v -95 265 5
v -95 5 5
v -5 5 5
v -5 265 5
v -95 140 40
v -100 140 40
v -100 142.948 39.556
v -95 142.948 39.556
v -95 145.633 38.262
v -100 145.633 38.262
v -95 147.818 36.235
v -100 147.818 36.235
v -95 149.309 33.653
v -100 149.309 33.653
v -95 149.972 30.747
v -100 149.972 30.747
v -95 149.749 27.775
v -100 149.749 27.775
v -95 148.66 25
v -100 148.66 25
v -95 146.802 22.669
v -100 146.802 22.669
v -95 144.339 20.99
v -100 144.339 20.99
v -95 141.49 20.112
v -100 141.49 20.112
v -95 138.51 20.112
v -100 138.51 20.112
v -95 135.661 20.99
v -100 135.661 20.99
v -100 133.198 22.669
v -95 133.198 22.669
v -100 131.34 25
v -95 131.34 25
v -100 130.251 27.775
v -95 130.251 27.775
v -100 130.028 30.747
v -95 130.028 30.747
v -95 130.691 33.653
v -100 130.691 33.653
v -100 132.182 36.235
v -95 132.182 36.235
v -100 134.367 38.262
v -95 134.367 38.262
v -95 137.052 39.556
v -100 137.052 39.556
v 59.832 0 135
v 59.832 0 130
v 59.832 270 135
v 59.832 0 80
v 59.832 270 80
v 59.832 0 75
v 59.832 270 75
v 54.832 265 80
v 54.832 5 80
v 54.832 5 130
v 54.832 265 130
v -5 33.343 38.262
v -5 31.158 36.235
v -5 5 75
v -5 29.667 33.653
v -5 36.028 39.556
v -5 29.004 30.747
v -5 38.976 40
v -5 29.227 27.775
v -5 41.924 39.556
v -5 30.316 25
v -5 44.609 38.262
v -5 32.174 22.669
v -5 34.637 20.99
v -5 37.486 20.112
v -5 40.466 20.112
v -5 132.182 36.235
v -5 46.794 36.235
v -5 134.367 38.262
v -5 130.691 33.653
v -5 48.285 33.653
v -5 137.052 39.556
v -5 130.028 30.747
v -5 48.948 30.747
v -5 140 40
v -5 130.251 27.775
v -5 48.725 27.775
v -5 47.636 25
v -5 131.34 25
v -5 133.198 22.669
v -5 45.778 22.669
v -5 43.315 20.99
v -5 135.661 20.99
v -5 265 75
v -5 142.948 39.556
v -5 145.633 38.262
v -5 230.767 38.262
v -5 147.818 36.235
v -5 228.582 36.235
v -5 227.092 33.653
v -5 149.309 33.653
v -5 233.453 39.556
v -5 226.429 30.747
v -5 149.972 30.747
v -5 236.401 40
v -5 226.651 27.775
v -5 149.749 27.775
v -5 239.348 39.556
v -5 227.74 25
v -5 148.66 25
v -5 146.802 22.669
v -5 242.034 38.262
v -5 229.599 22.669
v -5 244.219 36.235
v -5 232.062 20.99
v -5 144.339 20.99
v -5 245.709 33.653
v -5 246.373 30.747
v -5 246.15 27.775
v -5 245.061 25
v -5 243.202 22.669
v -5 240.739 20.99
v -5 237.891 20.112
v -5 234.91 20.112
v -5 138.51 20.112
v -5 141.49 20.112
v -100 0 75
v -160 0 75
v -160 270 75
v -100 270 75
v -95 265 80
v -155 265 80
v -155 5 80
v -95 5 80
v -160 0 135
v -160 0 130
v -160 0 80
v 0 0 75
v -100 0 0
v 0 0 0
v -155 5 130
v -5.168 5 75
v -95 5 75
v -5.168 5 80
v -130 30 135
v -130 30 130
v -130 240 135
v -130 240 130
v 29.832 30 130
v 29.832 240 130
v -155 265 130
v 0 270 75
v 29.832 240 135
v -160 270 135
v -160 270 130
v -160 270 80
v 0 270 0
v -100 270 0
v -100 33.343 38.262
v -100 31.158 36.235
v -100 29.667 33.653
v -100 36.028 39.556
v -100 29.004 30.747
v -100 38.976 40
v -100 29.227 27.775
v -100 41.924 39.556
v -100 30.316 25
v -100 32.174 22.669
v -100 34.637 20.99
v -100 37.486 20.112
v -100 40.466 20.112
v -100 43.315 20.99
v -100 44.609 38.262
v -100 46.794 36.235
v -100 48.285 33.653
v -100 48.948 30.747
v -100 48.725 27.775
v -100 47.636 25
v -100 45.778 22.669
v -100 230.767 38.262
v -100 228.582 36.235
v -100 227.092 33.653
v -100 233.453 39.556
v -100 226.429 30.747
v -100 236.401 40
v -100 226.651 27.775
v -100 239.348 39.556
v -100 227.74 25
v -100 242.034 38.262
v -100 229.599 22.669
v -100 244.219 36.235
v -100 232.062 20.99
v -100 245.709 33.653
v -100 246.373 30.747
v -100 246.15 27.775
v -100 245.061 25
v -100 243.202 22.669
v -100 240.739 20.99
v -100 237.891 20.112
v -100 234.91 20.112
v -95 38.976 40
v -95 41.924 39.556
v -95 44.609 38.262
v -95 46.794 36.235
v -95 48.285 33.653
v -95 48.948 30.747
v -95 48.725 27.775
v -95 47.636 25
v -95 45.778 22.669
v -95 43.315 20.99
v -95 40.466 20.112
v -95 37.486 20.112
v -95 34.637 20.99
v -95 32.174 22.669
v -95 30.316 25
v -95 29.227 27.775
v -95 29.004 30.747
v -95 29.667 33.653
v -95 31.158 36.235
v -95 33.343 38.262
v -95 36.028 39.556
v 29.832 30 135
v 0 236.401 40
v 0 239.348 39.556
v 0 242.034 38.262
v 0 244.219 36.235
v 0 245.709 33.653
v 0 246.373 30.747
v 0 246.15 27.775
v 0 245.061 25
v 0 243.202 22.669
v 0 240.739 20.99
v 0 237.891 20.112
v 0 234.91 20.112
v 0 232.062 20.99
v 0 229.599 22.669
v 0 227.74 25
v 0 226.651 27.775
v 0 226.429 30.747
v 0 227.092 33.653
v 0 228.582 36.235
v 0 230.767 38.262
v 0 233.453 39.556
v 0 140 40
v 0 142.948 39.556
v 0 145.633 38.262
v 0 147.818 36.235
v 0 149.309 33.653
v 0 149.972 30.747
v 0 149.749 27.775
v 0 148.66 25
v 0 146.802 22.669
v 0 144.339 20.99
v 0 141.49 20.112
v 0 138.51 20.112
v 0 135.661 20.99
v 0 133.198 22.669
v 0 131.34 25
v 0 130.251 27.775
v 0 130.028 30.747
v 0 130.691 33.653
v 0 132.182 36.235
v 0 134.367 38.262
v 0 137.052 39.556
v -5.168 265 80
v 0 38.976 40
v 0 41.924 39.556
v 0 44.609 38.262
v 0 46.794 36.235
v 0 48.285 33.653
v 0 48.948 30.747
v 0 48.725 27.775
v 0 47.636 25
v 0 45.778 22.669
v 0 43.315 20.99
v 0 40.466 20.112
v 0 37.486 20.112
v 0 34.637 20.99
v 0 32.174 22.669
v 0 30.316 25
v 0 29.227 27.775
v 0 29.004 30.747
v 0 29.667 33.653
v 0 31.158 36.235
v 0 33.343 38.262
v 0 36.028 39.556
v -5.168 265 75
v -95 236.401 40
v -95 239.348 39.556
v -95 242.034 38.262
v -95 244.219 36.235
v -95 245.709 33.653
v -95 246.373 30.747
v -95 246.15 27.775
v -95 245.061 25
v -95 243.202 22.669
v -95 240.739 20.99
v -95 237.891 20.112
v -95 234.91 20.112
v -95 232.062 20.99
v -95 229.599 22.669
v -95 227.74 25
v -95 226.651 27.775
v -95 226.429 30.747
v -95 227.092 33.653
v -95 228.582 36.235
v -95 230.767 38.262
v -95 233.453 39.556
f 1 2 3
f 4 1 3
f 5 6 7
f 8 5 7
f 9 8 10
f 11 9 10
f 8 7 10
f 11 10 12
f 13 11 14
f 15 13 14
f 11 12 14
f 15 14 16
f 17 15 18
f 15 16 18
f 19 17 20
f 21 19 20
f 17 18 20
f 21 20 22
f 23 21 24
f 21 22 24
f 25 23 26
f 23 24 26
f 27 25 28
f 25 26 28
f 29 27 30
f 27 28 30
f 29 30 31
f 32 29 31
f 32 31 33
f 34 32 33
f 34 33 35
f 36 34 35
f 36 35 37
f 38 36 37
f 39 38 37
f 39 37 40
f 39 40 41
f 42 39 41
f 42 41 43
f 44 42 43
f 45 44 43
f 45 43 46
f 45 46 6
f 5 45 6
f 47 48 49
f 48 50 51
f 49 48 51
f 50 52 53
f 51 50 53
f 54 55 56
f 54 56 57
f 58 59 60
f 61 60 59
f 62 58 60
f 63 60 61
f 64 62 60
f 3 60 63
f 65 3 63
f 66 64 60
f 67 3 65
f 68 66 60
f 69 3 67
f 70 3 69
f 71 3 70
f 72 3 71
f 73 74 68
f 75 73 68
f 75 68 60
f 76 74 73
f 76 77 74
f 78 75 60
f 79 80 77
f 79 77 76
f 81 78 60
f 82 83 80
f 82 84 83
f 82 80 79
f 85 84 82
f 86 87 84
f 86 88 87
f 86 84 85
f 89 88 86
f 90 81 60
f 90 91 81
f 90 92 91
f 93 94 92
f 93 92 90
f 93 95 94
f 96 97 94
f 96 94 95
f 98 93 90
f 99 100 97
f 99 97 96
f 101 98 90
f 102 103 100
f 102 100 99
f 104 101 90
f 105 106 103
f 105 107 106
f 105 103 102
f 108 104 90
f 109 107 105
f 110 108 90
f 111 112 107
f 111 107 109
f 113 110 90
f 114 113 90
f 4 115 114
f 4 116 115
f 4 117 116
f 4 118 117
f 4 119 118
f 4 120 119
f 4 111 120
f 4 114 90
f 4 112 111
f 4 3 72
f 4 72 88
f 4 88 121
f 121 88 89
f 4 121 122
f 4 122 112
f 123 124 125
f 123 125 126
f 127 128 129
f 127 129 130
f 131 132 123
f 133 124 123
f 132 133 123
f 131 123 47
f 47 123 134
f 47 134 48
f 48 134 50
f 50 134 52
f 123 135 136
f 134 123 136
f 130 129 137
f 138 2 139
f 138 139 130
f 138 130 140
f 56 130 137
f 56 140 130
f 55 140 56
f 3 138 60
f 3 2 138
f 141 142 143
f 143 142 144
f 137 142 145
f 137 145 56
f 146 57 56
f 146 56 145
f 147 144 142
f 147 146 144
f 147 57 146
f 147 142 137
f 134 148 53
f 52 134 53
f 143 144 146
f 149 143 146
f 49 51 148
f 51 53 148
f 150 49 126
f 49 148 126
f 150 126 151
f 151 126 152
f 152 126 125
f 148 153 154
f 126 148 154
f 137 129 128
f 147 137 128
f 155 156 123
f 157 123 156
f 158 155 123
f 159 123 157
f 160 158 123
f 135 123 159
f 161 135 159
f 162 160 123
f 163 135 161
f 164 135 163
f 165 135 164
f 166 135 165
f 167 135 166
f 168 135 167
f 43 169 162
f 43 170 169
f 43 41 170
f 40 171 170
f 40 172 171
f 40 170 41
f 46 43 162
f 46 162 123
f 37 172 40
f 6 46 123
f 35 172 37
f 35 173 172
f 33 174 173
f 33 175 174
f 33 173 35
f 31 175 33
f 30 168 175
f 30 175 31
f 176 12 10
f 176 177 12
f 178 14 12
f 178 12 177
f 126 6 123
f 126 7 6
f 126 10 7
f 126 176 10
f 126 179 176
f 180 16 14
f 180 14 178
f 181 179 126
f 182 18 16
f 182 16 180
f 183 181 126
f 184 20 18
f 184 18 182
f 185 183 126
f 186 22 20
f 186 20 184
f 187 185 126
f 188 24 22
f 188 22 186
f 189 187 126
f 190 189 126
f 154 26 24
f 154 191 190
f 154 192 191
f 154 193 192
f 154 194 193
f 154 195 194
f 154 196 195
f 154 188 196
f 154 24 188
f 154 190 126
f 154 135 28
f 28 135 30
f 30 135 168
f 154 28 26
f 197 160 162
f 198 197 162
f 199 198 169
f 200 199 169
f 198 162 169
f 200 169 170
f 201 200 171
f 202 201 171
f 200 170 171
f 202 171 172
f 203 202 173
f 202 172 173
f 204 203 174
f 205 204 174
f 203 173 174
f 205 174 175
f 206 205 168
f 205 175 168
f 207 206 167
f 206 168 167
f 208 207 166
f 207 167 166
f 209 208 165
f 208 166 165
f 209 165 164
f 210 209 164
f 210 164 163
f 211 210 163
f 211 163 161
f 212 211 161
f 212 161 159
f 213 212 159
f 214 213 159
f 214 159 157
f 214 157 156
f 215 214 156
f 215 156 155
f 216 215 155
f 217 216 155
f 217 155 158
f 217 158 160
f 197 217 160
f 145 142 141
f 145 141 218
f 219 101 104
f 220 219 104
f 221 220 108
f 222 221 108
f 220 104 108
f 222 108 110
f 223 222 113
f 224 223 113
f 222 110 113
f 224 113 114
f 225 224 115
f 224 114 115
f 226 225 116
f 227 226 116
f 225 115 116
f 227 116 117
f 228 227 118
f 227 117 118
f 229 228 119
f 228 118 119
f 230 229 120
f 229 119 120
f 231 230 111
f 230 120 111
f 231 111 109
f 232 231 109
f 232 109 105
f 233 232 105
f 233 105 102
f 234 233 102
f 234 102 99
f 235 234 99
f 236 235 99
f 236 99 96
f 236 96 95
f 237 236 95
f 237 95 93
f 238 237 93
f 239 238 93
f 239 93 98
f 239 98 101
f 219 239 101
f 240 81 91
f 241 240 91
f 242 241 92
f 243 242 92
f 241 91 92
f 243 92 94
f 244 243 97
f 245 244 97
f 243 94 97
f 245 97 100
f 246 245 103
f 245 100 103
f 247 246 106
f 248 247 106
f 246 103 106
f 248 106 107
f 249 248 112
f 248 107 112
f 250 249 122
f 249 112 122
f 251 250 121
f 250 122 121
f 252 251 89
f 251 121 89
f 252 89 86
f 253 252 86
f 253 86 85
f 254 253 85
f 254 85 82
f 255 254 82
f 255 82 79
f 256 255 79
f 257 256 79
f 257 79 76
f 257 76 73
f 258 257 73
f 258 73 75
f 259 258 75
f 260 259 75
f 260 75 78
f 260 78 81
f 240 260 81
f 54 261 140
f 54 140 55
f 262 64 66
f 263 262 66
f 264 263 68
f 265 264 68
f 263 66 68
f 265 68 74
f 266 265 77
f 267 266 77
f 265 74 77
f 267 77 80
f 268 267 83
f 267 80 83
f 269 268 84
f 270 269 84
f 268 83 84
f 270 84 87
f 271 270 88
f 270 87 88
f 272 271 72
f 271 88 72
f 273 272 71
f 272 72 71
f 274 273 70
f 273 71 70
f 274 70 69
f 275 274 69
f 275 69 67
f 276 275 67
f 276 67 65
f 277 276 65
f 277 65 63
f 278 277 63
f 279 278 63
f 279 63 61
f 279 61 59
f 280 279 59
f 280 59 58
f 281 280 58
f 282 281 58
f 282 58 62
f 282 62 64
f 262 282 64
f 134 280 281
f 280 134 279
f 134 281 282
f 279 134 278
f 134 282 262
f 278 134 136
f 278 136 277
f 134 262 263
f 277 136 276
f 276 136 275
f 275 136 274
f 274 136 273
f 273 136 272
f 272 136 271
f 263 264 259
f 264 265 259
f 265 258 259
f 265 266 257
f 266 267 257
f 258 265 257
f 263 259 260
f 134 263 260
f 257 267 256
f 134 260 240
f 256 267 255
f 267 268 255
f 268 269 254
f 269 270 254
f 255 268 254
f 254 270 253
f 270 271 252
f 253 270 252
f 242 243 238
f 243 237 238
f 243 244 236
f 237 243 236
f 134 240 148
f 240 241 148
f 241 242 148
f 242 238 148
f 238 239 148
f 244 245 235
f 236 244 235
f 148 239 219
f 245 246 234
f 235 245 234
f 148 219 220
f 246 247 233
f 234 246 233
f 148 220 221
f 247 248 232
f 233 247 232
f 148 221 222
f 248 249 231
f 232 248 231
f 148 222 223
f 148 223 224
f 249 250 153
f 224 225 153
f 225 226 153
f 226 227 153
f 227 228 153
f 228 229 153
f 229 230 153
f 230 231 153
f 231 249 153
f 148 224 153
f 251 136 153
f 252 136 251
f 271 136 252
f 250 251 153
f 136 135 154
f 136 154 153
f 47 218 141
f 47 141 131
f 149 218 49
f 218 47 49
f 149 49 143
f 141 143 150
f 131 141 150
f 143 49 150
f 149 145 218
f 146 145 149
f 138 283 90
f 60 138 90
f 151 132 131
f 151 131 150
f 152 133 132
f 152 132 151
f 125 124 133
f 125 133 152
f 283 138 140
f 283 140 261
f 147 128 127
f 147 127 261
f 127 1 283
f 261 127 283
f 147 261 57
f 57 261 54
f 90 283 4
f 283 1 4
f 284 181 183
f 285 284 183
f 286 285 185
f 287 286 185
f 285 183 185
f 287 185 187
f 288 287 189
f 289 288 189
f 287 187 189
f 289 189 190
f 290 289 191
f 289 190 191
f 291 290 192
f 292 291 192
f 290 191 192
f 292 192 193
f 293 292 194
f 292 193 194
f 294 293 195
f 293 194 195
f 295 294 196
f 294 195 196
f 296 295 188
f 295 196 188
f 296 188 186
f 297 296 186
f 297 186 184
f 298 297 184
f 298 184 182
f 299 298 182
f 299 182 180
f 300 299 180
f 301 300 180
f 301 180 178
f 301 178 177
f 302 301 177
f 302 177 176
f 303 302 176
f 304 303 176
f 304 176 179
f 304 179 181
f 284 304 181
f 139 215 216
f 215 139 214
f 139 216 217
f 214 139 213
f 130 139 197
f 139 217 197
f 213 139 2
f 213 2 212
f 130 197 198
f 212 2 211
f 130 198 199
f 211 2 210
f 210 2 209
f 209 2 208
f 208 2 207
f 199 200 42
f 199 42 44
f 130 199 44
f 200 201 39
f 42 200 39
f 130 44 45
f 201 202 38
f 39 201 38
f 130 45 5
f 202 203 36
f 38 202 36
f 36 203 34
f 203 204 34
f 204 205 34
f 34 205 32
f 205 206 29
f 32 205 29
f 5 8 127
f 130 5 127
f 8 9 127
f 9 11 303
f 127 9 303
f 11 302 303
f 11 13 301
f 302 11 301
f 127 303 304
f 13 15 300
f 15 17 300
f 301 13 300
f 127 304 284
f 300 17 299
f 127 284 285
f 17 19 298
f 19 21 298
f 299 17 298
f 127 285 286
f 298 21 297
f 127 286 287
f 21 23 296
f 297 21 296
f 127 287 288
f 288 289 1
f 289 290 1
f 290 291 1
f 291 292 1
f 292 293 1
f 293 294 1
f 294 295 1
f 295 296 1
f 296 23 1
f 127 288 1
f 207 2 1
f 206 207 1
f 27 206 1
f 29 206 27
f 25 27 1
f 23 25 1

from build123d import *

# Parameters (mm, degrees)
ESQUISSE1_W             = 100
ESQUISSE1_H             = 270
BOSS_EXTRU_1_DEPTH      = 5
ESQUISSE2_W             = 100
ESQUISSE2_H             = 270
ESQUISSE2_W_2           = 90
ESQUISSE2_H_2           = 260
BOSS_EXTRU_2_DEPTH      = 70
ESQUISSE3_W             = 65
ESQUISSE3_H             = 270
BOSS_EXTRU_4_DEPTH      = 5
ESQUISSE5_W             = 90
ESQUISSE5_H             = 5
ESQUISSE5_W_2           = 89.831851537
BOSS_EXTRU_5_DEPTH      = 5
ESQUISSE6_W             = 219.831851537
ESQUISSE6_H             = 270
ESQUISSE6_W_2           = 209.831851537
ESQUISSE6_H_2           = 260
BOSS_EXTRU_6_DEPTH      = 50
ESQUISSE7_R             = 10
ENL_V_MAT_EXTRU_1_DEPTH = 340.626590193
ESQUISSE8_W             = 159.831851537
ESQUISSE8_H             = 210
BOSS_EXTRU_7_DEPTH      = 5


with BuildPart() as part:
    # Esquisse1 → Boss.-Extru.1 (new body)
    with BuildSketch(Plane.XY):
        with Locations((-50, 135)):
            Rectangle(ESQUISSE1_W, ESQUISSE1_H)
    extrude(amount=BOSS_EXTRU_1_DEPTH)

    # Esquisse2 → Boss.-Extru.2 (add)
    with BuildSketch(Plane.XY.offset(5)):
        with Locations((-50, 135)):
            Rectangle(ESQUISSE2_W, ESQUISSE2_H)
        with Locations((-50, 135)):
            Rectangle(ESQUISSE2_W_2, ESQUISSE2_H_2, mode=Mode.SUBTRACT)
    extrude(amount=BOSS_EXTRU_2_DEPTH)

    # Esquisse3 → Boss.-Extru.4 (add)
    with BuildSketch(Plane.XY.offset(75)):
        with Locations((-127.5, 135)):
            Rectangle(ESQUISSE3_W, ESQUISSE3_H)
        with Locations((27.331851537, 135)):
            Rectangle(ESQUISSE3_W, ESQUISSE3_H)
    extrude(amount=BOSS_EXTRU_4_DEPTH)

    # Esquisse5 → Boss.-Extru.5 (add)
    with BuildSketch(Plane.XY.offset(75)):
        with Locations((-50, 267.5)):
            Rectangle(ESQUISSE5_W, ESQUISSE5_H)
        with Locations((-50.084074231, 2.5)):
            Rectangle(ESQUISSE5_W_2, ESQUISSE5_H)
    extrude(amount=BOSS_EXTRU_5_DEPTH)

    # Esquisse6 → Boss.-Extru.6 (add)
    with BuildSketch(Plane.XY.offset(80)):
        with Locations((-50.084074231, 135)):
            Rectangle(ESQUISSE6_W, ESQUISSE6_H)
        with Locations((-50.084074231, 135)):
            Rectangle(ESQUISSE6_W_2, ESQUISSE6_H_2, mode=Mode.SUBTRACT)
    extrude(amount=BOSS_EXTRU_6_DEPTH)

    # Esquisse7 → Enlèv. mat.-Extru.1 (cut, through all)
    with BuildSketch(Plane.ZY.offset(100)):
        with Locations((30, 140)):
            Circle(ESQUISSE7_R)
        with Locations((30, 38.975952284)):
            Circle(ESQUISSE7_R)
        with Locations((30, 236.400600349)):
            Circle(ESQUISSE7_R)
    extrude(amount=-ENL_V_MAT_EXTRU_1_DEPTH, mode=Mode.SUBTRACT)

    # Esquisse8 → Boss.-Extru.7 (add)
    with BuildSketch(Plane.XY.offset(130)):
        Polygon((-160, 270), (-130, 270), (59.831851537, 270), (59.831851537, 240), (59.831851537, 0), (29.831851537, 0), (-130, 0), (-160, 0), align=None)
        with Locations((-50.084074231, 135)):
            Rectangle(ESQUISSE8_W, ESQUISSE8_H, mode=Mode.SUBTRACT)
    extrude(amount=BOSS_EXTRU_7_DEPTH)


solid = part.part
